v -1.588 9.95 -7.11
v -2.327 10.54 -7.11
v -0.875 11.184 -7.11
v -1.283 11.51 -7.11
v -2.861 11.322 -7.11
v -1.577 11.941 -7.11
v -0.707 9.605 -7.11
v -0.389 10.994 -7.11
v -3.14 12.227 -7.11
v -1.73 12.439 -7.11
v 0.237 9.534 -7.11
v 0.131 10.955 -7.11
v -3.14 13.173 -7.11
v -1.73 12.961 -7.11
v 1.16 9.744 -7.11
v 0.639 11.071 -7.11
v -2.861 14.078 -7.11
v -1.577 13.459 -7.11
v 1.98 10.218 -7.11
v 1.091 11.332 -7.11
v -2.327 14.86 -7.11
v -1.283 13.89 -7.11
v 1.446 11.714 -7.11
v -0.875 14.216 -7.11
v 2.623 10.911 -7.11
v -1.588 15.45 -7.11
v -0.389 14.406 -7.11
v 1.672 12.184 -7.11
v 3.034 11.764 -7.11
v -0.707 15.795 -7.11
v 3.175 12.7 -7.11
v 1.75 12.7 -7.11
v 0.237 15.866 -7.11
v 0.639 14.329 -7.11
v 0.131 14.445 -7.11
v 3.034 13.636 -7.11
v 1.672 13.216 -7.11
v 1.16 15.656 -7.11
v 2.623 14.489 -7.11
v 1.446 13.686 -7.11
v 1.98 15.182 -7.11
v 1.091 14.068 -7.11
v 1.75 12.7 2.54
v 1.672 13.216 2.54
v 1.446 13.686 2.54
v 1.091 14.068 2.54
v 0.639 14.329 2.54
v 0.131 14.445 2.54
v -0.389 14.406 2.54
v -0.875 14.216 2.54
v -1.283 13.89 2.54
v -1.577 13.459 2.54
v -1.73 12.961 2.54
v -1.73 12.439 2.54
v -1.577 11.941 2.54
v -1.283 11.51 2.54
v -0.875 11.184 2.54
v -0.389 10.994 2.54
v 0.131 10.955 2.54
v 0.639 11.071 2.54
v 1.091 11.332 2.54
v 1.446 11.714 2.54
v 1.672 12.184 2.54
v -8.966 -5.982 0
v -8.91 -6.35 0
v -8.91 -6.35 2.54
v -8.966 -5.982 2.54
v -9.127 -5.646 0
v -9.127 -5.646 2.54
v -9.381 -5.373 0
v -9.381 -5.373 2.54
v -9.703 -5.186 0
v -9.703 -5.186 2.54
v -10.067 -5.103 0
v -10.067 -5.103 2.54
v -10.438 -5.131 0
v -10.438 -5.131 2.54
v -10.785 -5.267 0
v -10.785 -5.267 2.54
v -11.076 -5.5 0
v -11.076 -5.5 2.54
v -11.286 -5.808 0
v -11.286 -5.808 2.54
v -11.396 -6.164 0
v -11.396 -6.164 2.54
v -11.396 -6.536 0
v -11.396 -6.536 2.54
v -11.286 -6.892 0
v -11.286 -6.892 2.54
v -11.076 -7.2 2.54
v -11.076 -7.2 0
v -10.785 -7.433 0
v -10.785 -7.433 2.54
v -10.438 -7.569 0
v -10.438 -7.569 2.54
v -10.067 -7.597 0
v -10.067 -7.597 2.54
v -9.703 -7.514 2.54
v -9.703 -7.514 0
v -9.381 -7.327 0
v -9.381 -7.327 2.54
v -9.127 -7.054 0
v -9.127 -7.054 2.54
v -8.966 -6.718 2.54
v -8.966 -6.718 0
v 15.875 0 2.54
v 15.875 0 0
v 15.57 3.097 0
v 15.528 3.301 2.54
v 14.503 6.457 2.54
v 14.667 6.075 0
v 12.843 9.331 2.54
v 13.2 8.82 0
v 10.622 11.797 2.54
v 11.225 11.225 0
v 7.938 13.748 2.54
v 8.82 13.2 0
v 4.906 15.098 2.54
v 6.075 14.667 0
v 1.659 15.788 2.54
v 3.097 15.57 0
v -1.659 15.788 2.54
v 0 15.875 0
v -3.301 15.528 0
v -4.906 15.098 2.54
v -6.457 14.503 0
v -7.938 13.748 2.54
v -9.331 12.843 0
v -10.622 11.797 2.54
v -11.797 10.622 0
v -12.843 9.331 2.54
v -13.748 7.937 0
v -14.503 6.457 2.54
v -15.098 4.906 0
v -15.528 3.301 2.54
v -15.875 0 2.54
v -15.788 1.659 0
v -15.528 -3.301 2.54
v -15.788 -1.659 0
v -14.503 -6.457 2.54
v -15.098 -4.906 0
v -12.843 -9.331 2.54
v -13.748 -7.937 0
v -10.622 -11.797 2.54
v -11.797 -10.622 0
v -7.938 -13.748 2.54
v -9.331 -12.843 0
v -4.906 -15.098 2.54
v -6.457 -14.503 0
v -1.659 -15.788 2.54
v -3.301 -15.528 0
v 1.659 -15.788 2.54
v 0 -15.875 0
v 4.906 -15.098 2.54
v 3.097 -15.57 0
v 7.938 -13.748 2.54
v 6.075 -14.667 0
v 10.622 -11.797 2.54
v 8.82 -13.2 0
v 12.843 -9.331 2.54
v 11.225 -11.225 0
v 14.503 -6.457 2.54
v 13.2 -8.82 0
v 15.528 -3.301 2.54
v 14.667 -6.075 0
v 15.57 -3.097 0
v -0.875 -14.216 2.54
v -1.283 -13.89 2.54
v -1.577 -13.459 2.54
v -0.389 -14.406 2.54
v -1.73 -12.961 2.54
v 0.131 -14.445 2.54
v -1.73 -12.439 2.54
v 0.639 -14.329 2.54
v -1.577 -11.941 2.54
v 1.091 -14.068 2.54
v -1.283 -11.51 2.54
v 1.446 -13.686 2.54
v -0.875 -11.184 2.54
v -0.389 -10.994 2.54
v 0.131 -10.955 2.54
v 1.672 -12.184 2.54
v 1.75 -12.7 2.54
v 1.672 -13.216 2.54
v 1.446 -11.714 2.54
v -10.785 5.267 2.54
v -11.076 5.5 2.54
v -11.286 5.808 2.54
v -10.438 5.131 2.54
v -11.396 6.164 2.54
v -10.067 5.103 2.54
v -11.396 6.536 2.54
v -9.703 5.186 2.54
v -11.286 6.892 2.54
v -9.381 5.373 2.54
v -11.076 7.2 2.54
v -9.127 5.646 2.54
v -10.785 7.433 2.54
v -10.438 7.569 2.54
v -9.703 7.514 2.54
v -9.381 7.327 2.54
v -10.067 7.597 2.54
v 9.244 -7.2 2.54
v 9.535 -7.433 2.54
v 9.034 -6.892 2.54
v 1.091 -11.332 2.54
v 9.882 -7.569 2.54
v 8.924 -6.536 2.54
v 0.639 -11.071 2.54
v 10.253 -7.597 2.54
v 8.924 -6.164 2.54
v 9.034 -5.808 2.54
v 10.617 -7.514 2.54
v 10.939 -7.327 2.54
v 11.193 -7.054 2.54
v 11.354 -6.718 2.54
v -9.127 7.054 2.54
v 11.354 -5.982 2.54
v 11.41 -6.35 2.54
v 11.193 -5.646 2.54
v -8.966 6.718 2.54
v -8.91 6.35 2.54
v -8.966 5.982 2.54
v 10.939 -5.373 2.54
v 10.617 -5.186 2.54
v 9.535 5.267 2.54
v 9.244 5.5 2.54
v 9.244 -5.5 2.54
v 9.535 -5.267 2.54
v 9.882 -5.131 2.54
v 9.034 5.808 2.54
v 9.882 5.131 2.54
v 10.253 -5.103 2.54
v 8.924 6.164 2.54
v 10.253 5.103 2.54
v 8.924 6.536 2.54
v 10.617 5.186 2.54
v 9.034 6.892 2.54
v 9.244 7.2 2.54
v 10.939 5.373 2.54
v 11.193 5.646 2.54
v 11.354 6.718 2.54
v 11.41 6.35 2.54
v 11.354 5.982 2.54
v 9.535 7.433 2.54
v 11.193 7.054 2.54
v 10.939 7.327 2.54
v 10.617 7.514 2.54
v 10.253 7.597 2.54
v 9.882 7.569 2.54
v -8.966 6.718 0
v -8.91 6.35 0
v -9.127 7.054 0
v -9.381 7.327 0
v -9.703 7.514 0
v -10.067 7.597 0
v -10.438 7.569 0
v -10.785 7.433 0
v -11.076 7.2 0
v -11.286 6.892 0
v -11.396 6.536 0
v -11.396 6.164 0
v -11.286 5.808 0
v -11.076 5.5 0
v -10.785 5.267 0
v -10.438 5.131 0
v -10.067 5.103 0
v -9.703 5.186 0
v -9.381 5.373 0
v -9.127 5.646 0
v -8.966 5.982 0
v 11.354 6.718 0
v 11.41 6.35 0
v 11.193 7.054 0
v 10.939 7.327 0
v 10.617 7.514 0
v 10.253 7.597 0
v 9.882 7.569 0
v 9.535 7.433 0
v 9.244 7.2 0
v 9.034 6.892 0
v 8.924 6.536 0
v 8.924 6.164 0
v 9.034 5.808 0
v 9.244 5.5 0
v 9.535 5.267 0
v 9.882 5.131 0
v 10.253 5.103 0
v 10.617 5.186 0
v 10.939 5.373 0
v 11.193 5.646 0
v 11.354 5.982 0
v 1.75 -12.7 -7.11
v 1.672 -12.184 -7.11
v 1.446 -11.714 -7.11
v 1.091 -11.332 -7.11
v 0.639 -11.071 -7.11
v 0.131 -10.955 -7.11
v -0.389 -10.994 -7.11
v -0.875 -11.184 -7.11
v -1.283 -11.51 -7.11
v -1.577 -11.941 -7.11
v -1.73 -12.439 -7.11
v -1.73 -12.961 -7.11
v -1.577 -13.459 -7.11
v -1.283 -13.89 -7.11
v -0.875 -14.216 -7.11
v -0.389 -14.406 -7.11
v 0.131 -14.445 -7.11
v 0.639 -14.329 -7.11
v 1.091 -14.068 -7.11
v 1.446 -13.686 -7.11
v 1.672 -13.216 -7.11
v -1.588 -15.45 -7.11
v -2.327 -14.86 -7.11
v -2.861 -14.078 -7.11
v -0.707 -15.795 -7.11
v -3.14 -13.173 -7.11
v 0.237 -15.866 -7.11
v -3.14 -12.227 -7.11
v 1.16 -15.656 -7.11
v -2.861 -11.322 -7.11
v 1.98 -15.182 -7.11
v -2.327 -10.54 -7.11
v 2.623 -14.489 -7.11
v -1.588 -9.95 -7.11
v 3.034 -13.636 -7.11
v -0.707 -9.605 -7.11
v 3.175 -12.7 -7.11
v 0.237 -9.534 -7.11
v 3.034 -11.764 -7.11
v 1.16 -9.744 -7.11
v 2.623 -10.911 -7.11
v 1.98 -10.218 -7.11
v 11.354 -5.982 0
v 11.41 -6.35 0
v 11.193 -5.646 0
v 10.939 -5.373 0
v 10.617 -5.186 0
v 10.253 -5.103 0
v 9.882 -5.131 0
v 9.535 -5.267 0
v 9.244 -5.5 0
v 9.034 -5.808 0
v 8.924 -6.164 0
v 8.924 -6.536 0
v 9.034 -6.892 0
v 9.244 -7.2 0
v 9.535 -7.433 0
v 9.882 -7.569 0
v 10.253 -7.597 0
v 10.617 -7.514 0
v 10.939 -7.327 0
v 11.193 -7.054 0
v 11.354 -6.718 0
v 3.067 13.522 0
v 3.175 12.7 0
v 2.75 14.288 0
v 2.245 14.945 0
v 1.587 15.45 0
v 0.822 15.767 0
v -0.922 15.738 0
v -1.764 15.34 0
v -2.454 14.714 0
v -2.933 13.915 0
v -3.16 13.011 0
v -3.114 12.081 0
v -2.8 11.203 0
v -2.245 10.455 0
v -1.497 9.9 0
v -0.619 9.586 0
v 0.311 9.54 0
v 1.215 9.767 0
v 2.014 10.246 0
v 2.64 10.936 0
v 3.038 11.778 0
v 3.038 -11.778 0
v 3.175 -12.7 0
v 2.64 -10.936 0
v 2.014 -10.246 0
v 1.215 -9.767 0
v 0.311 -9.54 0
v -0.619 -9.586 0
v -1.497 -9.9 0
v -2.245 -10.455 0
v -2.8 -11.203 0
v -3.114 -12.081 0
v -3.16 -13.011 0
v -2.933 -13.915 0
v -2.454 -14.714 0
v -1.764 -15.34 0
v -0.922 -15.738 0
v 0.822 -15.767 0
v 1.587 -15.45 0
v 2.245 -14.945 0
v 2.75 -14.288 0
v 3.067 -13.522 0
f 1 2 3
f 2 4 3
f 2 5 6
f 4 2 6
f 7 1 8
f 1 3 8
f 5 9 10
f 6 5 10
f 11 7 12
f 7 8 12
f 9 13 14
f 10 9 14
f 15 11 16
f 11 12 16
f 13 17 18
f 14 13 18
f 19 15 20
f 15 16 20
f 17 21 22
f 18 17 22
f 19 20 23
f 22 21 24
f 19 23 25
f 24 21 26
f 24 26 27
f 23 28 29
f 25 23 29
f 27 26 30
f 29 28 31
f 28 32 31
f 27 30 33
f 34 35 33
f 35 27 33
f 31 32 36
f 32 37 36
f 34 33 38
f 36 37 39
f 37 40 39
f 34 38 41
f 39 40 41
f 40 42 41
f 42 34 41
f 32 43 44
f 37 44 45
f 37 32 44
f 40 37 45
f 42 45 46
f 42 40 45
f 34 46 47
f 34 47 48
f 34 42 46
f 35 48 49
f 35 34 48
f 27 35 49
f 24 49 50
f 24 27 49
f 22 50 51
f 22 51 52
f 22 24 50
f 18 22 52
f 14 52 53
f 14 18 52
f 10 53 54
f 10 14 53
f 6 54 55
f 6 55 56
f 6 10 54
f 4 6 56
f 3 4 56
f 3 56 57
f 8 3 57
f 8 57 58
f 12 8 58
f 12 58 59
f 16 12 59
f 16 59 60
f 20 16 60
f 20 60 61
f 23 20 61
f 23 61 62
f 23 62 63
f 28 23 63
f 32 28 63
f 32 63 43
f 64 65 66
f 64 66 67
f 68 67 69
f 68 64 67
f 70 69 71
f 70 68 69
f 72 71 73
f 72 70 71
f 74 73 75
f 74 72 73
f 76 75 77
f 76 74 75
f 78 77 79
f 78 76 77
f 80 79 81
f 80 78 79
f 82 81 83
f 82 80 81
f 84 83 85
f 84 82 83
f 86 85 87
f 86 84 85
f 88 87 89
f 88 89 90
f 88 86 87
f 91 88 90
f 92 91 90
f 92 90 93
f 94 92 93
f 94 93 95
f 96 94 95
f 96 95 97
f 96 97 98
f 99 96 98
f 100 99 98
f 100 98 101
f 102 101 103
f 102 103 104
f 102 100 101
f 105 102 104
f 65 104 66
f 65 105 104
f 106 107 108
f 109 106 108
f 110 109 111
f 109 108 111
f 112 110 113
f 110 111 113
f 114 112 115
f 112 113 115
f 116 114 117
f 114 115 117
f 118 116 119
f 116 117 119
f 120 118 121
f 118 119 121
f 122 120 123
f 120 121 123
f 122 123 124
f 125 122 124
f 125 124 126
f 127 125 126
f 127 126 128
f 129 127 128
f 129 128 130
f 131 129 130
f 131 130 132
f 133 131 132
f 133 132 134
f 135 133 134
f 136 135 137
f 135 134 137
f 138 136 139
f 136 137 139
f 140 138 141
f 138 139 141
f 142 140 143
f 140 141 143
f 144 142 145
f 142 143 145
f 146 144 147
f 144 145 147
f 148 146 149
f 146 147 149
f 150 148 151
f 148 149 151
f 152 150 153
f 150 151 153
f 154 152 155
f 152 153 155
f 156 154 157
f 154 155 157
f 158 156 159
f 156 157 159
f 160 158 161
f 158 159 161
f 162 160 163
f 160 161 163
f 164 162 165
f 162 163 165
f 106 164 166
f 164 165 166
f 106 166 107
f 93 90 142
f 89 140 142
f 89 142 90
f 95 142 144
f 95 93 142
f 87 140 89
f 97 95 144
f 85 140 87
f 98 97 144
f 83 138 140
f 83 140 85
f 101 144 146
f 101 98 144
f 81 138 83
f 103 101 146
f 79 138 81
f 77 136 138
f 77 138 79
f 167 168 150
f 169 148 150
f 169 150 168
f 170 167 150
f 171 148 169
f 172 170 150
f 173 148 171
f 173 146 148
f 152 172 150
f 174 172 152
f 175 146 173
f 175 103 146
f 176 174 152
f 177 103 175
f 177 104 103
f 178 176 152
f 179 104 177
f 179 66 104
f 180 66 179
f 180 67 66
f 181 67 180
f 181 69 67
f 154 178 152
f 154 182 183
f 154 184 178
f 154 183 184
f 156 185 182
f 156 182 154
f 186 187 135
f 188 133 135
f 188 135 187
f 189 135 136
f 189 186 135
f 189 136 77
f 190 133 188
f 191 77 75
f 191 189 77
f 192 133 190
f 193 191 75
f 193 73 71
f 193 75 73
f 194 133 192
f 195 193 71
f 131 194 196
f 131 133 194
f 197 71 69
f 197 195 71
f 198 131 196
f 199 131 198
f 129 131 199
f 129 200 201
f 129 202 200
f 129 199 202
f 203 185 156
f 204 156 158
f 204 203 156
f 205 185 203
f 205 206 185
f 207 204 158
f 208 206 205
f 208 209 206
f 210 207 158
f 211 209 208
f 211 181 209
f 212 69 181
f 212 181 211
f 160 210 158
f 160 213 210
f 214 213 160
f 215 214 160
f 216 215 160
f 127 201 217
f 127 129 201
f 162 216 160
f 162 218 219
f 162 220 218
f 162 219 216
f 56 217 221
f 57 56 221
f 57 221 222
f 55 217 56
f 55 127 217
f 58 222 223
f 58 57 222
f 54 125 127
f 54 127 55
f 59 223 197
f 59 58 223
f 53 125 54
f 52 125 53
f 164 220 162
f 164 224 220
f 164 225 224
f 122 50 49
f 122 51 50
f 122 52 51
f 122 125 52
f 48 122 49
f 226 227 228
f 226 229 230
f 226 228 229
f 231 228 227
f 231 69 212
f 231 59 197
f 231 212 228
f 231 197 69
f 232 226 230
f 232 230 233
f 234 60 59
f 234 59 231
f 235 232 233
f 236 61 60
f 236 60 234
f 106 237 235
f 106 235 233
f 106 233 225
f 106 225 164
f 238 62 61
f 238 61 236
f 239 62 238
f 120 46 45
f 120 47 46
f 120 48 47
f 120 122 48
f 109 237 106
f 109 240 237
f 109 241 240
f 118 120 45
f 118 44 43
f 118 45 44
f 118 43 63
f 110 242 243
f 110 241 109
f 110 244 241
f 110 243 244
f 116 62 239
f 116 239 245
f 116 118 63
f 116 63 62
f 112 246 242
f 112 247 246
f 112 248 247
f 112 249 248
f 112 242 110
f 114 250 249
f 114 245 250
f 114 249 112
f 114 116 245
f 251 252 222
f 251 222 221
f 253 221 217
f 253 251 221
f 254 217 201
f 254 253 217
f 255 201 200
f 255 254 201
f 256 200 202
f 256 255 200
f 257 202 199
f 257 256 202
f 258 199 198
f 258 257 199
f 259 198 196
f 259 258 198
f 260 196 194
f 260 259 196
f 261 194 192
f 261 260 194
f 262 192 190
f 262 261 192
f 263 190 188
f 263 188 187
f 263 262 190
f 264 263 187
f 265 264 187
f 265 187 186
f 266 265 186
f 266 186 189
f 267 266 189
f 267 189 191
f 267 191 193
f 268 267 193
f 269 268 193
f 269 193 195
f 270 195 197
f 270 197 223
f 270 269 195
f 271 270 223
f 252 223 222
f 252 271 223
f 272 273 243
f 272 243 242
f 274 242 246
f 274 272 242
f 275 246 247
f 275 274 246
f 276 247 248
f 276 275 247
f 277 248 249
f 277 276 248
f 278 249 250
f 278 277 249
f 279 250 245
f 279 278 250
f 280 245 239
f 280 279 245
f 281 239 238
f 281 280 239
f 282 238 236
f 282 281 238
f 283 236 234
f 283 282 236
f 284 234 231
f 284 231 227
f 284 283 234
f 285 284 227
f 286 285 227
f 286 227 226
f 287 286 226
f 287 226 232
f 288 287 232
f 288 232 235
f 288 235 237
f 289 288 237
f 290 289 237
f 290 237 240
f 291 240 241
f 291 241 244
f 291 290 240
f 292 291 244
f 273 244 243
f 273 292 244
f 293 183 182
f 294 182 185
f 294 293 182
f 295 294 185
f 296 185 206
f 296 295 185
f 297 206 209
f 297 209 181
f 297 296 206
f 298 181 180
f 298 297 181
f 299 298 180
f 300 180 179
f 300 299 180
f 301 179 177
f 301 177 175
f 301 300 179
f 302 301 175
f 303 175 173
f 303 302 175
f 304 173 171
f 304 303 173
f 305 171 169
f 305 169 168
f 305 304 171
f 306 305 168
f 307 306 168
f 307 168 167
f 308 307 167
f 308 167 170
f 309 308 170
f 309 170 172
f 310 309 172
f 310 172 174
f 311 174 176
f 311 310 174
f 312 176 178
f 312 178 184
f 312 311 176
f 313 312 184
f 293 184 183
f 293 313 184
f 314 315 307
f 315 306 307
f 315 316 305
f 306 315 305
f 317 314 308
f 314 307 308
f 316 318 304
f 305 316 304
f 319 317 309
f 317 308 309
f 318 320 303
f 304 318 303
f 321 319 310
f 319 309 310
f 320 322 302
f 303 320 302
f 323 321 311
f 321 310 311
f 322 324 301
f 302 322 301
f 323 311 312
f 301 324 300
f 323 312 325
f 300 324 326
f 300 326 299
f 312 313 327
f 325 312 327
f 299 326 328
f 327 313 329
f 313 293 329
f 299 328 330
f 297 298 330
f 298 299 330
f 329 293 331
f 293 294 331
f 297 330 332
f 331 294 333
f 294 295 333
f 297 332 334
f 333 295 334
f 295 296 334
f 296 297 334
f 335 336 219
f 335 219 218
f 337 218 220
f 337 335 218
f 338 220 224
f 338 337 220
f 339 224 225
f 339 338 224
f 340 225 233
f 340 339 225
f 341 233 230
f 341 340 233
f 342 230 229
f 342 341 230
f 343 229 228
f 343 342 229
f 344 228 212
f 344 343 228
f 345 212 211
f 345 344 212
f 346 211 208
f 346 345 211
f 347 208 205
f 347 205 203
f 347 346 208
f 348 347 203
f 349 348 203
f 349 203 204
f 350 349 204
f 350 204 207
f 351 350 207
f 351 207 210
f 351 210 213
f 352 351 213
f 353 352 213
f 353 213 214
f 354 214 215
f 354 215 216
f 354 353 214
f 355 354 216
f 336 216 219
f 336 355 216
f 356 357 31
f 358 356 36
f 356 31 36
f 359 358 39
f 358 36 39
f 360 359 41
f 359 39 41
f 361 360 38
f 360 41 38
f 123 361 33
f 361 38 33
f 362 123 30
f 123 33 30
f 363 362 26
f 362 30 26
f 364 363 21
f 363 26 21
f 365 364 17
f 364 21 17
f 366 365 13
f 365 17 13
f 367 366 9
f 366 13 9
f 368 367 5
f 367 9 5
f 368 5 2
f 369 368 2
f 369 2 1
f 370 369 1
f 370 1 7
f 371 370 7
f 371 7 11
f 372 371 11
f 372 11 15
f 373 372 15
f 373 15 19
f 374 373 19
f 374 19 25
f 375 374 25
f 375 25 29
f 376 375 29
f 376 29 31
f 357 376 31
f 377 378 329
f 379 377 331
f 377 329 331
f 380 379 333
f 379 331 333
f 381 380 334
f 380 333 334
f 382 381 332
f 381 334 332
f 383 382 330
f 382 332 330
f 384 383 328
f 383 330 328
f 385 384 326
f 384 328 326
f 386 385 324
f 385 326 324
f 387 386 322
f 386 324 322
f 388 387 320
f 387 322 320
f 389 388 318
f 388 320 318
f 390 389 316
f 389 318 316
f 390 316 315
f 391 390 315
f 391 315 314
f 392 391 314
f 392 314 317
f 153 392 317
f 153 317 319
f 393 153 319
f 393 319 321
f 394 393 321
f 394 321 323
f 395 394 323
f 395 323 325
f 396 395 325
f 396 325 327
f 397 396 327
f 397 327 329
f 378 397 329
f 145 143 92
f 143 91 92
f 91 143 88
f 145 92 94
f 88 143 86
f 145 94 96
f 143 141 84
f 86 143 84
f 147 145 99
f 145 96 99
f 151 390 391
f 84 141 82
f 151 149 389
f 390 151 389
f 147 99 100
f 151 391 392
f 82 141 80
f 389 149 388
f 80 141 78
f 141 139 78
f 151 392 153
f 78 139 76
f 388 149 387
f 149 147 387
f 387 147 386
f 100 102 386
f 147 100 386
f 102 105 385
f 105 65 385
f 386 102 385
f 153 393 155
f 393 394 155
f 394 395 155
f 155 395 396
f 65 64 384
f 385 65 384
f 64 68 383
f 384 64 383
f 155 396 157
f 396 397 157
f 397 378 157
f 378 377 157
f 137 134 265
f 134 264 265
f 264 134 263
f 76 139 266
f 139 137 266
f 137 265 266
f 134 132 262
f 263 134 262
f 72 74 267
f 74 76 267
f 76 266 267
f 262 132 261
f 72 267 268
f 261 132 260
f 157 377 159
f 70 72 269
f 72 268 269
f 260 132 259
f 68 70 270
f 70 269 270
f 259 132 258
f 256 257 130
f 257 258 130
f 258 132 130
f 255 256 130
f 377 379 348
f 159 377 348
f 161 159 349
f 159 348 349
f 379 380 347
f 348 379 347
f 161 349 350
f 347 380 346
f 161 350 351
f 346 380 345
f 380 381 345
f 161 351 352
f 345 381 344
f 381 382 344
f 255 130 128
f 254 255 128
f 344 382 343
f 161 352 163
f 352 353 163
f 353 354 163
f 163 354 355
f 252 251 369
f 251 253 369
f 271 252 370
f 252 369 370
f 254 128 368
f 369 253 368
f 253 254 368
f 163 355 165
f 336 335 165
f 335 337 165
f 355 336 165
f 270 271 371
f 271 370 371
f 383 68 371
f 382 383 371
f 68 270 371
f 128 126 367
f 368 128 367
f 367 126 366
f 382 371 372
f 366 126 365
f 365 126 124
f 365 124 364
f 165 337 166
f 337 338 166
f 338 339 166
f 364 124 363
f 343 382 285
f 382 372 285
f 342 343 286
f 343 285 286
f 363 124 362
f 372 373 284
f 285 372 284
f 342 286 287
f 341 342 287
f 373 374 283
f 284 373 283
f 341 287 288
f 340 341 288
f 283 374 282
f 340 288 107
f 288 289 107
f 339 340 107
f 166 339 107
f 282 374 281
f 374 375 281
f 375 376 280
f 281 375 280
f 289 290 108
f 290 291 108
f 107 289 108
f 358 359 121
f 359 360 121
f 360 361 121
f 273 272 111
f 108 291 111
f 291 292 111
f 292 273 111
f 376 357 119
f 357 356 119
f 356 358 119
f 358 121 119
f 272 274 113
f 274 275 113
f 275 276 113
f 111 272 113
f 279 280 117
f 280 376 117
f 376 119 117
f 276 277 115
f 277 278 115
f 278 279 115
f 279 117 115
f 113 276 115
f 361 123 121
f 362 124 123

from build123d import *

# Parameters (mm, degrees)
SKETCH1_R           = 15.875
SKETCH1_R_2         = 1.75
SKETCH1_R_3         = 1.25
BOSS_EXTRUDE1_DEPTH = 2.54
BOSS_EXTRUDE2_START = -7.110000004
SKETCH1_3_R         = 3.175
SKETCH1_3_R_2       = 1.75
BOSS_EXTRUDE2_DEPTH = 7.110000004


with BuildPart() as part:
    # Sketch1 → Boss-Extrude1 (new body)
    with BuildSketch(Plane.XY):
        Circle(SKETCH1_R)
        with Locations((0, 12.7)):
            Circle(SKETCH1_R_2, mode=Mode.SUBTRACT)
        with Locations((0, -12.7)):
            Circle(SKETCH1_R_2, mode=Mode.SUBTRACT)
        with Locations((-10.16, 6.35)):
            Circle(SKETCH1_R_3, mode=Mode.SUBTRACT)
        with Locations((10.16, 6.35)):
            Circle(SKETCH1_R_3, mode=Mode.SUBTRACT)
        with Locations((10.16, -6.35)):
            Circle(SKETCH1_R_3, mode=Mode.SUBTRACT)
        with Locations((-10.16, -6.35)):
            Circle(SKETCH1_R_3, mode=Mode.SUBTRACT)
    extrude(amount=BOSS_EXTRUDE1_DEPTH)

    # Sketch1<3> → Boss-Extrude2 (add)
    # profile 1 of 2: a face of its own
    with BuildSketch(Plane.XY.offset(BOSS_EXTRUDE2_START)):
        with Locations((0, 12.7)):
            Circle(SKETCH1_3_R)
        with Locations((0, 12.7)):
            Circle(SKETCH1_3_R_2, mode=Mode.SUBTRACT)
    # profile 2 of 2: a face of its own
    with BuildSketch(Plane.XY.offset(BOSS_EXTRUDE2_START)):
        with Locations((0, -12.7)):
            Circle(SKETCH1_3_R)
        with Locations((0, -12.7)):
            Circle(SKETCH1_3_R_2, mode=Mode.SUBTRACT)
    extrude(amount=BOSS_EXTRUDE2_DEPTH)


solid = part.part
